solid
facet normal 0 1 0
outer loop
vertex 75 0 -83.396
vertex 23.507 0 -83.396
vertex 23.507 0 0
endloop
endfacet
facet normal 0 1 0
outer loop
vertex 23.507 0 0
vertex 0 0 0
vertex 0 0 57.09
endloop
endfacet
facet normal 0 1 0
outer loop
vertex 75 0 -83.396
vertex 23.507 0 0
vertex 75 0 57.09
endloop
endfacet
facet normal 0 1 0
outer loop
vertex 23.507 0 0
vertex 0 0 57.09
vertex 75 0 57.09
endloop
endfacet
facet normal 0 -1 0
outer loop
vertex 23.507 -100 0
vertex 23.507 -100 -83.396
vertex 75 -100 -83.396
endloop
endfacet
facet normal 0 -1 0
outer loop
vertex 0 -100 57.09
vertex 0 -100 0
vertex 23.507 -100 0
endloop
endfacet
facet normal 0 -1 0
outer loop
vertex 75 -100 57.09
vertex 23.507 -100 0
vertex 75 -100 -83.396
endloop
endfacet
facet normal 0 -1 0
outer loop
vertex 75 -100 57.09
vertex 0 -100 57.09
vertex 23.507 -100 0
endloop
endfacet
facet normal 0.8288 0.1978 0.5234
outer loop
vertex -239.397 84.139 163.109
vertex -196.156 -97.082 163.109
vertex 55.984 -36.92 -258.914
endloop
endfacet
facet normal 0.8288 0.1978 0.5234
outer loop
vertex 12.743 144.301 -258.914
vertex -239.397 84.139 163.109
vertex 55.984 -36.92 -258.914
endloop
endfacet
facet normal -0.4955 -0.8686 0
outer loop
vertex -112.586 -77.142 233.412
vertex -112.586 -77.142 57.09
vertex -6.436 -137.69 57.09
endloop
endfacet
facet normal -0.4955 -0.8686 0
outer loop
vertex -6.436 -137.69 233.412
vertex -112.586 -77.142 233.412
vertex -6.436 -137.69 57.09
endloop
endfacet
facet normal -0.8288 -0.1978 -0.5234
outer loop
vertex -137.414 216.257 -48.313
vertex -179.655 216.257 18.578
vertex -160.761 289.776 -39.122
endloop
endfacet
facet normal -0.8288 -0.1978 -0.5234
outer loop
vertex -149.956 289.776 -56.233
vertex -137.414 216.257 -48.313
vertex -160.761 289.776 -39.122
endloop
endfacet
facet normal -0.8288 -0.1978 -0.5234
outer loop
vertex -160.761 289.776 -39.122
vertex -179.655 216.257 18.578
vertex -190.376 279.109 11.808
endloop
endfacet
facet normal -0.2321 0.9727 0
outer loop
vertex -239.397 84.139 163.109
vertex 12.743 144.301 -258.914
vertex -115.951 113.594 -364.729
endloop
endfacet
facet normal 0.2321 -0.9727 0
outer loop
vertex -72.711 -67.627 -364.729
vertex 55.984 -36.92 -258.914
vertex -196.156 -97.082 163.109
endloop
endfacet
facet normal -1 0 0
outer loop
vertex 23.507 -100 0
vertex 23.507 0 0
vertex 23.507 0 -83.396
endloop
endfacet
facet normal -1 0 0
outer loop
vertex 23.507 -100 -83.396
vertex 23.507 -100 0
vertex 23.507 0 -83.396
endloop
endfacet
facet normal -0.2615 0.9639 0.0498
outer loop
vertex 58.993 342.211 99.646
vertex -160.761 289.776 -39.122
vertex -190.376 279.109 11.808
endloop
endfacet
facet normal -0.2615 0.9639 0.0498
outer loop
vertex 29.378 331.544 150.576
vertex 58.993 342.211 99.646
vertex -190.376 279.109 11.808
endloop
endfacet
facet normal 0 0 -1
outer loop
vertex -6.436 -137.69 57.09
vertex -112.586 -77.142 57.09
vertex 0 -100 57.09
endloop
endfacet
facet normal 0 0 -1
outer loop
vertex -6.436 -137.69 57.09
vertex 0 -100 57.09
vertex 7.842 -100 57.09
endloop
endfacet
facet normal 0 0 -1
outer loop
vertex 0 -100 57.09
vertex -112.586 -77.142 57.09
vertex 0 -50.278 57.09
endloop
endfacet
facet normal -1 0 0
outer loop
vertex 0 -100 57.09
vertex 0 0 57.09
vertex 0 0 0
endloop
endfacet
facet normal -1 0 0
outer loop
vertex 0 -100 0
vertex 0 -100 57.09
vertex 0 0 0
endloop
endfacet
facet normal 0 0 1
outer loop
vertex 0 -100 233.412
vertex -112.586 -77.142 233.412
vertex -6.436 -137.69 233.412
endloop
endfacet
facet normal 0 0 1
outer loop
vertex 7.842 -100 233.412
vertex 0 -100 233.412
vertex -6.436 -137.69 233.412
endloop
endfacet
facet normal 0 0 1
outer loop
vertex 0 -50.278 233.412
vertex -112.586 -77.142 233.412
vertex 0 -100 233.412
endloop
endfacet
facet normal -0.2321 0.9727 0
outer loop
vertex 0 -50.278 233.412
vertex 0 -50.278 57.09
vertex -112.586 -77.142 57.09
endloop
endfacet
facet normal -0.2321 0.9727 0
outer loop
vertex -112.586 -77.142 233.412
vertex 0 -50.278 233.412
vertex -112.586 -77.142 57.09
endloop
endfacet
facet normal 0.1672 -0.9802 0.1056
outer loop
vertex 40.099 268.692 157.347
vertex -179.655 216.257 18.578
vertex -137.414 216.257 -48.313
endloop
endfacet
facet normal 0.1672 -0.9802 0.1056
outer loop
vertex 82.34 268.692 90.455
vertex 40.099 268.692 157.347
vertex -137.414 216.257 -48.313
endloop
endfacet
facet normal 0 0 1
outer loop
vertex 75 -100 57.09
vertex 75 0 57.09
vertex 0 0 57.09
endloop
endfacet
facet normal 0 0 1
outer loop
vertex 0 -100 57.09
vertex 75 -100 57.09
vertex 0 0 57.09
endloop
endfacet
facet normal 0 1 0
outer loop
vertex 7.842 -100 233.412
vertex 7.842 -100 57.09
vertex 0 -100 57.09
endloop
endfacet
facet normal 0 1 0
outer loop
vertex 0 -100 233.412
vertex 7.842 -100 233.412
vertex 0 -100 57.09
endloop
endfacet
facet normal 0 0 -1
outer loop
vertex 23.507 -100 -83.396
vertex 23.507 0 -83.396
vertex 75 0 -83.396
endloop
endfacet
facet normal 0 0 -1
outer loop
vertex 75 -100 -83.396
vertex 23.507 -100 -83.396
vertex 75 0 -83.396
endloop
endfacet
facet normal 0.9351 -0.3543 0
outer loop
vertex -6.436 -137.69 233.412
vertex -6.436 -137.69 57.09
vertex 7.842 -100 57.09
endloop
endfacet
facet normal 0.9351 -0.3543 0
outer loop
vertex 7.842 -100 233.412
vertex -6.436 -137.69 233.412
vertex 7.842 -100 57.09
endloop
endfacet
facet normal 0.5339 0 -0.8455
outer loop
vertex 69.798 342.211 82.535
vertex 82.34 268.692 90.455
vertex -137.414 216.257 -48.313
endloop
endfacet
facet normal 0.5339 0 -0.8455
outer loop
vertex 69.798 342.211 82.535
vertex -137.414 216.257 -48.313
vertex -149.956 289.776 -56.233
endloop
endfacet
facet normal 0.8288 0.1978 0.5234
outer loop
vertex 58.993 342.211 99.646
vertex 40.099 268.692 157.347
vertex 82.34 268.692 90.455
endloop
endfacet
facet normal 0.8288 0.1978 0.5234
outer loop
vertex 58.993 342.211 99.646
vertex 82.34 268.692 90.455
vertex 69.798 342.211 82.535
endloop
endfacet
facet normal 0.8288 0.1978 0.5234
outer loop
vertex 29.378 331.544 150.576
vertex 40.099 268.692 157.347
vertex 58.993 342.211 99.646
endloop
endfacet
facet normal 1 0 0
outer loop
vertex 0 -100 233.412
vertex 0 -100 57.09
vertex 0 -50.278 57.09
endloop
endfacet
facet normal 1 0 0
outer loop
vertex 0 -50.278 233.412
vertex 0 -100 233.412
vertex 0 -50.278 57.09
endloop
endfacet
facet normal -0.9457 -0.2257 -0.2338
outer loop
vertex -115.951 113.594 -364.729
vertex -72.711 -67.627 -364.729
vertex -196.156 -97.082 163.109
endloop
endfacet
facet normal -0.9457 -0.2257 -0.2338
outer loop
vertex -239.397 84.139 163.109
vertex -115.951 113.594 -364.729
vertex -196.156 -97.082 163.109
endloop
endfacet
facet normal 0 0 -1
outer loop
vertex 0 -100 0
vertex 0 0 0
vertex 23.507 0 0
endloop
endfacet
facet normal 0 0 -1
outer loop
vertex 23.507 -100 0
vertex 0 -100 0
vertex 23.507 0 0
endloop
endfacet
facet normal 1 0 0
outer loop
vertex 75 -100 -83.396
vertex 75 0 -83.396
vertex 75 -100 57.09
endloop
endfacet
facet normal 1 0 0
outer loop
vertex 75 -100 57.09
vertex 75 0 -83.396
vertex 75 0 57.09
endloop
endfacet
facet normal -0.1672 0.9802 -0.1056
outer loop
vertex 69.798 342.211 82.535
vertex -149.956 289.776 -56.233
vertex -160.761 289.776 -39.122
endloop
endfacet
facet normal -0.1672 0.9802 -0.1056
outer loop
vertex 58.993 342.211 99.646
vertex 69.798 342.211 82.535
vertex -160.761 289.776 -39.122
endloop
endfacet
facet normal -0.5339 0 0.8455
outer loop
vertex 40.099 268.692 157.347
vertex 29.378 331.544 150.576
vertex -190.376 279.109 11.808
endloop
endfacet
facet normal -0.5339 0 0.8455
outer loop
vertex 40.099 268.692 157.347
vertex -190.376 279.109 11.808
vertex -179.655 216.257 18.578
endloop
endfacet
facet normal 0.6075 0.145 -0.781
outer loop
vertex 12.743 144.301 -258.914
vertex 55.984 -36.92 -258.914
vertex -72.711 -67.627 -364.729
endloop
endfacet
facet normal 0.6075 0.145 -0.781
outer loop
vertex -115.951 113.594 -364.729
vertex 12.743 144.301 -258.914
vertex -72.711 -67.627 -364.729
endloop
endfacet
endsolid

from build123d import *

# Parameters (mm, degrees)
F1_DEPTH = 100
F3_DEPTH = 176.322058
F5_DEPTH = 186.308116
F7_DEPTH = 265.137523


with BuildPart() as f1:
    # F0 (on Front) → F1 (new body)
    with BuildSketch(Plane.XZ):
        Polygon((75, 57.08955), (0, 57.08955), (0, 0), (23.507464, 0), (23.507464, -83.395513), (75, -83.395513), align=None)
    extrude(amount=F1_DEPTH)


with BuildPart() as f3:
    # F2 (on face) → F3 (new body)
    with BuildSketch(Plane.XY.offset(57.08955)):
        Polygon((-112.585858, -77.141583), (-6.436452, -137.689829), (7.841947, -100), (0, -100), (0, -50.277686), align=None)
    extrude(amount=F3_DEPTH)


with BuildPart() as f5:
    # F4 (on face) → F5 (new body)
    with BuildSketch(Plane(origin=(11.350439, -47.569379, 0), x_dir=(-0.972694, -0.232093, 0), z_dir=(-0.232093, 0.972694, 0))):
        Polygon((86.420834, -364.72851), (213.331878, 163.108855), (-45.886248, -258.913845), align=None)
    extrude(amount=F5_DEPTH)


with BuildPart() as f7:
    # F6 (on face) → F7 (new body)
    with BuildSketch(Plane(origin=(-79.908656, -19.066853, -50.460004), x_dir=(-0.167217, 0.980249, -0.105593), z_dir=(0.82883, 0.197766, 0.523382))):
        Polygon((304.183447, 111.631159), (240.065169, 111.631159), (240.065169, 32.519052), (315.065169, 32.519052), (315.065169, 52.755509), align=None)
    extrude(amount=F7_DEPTH)


solid = Compound([f1.part, f3.part, f5.part, f7.part])
